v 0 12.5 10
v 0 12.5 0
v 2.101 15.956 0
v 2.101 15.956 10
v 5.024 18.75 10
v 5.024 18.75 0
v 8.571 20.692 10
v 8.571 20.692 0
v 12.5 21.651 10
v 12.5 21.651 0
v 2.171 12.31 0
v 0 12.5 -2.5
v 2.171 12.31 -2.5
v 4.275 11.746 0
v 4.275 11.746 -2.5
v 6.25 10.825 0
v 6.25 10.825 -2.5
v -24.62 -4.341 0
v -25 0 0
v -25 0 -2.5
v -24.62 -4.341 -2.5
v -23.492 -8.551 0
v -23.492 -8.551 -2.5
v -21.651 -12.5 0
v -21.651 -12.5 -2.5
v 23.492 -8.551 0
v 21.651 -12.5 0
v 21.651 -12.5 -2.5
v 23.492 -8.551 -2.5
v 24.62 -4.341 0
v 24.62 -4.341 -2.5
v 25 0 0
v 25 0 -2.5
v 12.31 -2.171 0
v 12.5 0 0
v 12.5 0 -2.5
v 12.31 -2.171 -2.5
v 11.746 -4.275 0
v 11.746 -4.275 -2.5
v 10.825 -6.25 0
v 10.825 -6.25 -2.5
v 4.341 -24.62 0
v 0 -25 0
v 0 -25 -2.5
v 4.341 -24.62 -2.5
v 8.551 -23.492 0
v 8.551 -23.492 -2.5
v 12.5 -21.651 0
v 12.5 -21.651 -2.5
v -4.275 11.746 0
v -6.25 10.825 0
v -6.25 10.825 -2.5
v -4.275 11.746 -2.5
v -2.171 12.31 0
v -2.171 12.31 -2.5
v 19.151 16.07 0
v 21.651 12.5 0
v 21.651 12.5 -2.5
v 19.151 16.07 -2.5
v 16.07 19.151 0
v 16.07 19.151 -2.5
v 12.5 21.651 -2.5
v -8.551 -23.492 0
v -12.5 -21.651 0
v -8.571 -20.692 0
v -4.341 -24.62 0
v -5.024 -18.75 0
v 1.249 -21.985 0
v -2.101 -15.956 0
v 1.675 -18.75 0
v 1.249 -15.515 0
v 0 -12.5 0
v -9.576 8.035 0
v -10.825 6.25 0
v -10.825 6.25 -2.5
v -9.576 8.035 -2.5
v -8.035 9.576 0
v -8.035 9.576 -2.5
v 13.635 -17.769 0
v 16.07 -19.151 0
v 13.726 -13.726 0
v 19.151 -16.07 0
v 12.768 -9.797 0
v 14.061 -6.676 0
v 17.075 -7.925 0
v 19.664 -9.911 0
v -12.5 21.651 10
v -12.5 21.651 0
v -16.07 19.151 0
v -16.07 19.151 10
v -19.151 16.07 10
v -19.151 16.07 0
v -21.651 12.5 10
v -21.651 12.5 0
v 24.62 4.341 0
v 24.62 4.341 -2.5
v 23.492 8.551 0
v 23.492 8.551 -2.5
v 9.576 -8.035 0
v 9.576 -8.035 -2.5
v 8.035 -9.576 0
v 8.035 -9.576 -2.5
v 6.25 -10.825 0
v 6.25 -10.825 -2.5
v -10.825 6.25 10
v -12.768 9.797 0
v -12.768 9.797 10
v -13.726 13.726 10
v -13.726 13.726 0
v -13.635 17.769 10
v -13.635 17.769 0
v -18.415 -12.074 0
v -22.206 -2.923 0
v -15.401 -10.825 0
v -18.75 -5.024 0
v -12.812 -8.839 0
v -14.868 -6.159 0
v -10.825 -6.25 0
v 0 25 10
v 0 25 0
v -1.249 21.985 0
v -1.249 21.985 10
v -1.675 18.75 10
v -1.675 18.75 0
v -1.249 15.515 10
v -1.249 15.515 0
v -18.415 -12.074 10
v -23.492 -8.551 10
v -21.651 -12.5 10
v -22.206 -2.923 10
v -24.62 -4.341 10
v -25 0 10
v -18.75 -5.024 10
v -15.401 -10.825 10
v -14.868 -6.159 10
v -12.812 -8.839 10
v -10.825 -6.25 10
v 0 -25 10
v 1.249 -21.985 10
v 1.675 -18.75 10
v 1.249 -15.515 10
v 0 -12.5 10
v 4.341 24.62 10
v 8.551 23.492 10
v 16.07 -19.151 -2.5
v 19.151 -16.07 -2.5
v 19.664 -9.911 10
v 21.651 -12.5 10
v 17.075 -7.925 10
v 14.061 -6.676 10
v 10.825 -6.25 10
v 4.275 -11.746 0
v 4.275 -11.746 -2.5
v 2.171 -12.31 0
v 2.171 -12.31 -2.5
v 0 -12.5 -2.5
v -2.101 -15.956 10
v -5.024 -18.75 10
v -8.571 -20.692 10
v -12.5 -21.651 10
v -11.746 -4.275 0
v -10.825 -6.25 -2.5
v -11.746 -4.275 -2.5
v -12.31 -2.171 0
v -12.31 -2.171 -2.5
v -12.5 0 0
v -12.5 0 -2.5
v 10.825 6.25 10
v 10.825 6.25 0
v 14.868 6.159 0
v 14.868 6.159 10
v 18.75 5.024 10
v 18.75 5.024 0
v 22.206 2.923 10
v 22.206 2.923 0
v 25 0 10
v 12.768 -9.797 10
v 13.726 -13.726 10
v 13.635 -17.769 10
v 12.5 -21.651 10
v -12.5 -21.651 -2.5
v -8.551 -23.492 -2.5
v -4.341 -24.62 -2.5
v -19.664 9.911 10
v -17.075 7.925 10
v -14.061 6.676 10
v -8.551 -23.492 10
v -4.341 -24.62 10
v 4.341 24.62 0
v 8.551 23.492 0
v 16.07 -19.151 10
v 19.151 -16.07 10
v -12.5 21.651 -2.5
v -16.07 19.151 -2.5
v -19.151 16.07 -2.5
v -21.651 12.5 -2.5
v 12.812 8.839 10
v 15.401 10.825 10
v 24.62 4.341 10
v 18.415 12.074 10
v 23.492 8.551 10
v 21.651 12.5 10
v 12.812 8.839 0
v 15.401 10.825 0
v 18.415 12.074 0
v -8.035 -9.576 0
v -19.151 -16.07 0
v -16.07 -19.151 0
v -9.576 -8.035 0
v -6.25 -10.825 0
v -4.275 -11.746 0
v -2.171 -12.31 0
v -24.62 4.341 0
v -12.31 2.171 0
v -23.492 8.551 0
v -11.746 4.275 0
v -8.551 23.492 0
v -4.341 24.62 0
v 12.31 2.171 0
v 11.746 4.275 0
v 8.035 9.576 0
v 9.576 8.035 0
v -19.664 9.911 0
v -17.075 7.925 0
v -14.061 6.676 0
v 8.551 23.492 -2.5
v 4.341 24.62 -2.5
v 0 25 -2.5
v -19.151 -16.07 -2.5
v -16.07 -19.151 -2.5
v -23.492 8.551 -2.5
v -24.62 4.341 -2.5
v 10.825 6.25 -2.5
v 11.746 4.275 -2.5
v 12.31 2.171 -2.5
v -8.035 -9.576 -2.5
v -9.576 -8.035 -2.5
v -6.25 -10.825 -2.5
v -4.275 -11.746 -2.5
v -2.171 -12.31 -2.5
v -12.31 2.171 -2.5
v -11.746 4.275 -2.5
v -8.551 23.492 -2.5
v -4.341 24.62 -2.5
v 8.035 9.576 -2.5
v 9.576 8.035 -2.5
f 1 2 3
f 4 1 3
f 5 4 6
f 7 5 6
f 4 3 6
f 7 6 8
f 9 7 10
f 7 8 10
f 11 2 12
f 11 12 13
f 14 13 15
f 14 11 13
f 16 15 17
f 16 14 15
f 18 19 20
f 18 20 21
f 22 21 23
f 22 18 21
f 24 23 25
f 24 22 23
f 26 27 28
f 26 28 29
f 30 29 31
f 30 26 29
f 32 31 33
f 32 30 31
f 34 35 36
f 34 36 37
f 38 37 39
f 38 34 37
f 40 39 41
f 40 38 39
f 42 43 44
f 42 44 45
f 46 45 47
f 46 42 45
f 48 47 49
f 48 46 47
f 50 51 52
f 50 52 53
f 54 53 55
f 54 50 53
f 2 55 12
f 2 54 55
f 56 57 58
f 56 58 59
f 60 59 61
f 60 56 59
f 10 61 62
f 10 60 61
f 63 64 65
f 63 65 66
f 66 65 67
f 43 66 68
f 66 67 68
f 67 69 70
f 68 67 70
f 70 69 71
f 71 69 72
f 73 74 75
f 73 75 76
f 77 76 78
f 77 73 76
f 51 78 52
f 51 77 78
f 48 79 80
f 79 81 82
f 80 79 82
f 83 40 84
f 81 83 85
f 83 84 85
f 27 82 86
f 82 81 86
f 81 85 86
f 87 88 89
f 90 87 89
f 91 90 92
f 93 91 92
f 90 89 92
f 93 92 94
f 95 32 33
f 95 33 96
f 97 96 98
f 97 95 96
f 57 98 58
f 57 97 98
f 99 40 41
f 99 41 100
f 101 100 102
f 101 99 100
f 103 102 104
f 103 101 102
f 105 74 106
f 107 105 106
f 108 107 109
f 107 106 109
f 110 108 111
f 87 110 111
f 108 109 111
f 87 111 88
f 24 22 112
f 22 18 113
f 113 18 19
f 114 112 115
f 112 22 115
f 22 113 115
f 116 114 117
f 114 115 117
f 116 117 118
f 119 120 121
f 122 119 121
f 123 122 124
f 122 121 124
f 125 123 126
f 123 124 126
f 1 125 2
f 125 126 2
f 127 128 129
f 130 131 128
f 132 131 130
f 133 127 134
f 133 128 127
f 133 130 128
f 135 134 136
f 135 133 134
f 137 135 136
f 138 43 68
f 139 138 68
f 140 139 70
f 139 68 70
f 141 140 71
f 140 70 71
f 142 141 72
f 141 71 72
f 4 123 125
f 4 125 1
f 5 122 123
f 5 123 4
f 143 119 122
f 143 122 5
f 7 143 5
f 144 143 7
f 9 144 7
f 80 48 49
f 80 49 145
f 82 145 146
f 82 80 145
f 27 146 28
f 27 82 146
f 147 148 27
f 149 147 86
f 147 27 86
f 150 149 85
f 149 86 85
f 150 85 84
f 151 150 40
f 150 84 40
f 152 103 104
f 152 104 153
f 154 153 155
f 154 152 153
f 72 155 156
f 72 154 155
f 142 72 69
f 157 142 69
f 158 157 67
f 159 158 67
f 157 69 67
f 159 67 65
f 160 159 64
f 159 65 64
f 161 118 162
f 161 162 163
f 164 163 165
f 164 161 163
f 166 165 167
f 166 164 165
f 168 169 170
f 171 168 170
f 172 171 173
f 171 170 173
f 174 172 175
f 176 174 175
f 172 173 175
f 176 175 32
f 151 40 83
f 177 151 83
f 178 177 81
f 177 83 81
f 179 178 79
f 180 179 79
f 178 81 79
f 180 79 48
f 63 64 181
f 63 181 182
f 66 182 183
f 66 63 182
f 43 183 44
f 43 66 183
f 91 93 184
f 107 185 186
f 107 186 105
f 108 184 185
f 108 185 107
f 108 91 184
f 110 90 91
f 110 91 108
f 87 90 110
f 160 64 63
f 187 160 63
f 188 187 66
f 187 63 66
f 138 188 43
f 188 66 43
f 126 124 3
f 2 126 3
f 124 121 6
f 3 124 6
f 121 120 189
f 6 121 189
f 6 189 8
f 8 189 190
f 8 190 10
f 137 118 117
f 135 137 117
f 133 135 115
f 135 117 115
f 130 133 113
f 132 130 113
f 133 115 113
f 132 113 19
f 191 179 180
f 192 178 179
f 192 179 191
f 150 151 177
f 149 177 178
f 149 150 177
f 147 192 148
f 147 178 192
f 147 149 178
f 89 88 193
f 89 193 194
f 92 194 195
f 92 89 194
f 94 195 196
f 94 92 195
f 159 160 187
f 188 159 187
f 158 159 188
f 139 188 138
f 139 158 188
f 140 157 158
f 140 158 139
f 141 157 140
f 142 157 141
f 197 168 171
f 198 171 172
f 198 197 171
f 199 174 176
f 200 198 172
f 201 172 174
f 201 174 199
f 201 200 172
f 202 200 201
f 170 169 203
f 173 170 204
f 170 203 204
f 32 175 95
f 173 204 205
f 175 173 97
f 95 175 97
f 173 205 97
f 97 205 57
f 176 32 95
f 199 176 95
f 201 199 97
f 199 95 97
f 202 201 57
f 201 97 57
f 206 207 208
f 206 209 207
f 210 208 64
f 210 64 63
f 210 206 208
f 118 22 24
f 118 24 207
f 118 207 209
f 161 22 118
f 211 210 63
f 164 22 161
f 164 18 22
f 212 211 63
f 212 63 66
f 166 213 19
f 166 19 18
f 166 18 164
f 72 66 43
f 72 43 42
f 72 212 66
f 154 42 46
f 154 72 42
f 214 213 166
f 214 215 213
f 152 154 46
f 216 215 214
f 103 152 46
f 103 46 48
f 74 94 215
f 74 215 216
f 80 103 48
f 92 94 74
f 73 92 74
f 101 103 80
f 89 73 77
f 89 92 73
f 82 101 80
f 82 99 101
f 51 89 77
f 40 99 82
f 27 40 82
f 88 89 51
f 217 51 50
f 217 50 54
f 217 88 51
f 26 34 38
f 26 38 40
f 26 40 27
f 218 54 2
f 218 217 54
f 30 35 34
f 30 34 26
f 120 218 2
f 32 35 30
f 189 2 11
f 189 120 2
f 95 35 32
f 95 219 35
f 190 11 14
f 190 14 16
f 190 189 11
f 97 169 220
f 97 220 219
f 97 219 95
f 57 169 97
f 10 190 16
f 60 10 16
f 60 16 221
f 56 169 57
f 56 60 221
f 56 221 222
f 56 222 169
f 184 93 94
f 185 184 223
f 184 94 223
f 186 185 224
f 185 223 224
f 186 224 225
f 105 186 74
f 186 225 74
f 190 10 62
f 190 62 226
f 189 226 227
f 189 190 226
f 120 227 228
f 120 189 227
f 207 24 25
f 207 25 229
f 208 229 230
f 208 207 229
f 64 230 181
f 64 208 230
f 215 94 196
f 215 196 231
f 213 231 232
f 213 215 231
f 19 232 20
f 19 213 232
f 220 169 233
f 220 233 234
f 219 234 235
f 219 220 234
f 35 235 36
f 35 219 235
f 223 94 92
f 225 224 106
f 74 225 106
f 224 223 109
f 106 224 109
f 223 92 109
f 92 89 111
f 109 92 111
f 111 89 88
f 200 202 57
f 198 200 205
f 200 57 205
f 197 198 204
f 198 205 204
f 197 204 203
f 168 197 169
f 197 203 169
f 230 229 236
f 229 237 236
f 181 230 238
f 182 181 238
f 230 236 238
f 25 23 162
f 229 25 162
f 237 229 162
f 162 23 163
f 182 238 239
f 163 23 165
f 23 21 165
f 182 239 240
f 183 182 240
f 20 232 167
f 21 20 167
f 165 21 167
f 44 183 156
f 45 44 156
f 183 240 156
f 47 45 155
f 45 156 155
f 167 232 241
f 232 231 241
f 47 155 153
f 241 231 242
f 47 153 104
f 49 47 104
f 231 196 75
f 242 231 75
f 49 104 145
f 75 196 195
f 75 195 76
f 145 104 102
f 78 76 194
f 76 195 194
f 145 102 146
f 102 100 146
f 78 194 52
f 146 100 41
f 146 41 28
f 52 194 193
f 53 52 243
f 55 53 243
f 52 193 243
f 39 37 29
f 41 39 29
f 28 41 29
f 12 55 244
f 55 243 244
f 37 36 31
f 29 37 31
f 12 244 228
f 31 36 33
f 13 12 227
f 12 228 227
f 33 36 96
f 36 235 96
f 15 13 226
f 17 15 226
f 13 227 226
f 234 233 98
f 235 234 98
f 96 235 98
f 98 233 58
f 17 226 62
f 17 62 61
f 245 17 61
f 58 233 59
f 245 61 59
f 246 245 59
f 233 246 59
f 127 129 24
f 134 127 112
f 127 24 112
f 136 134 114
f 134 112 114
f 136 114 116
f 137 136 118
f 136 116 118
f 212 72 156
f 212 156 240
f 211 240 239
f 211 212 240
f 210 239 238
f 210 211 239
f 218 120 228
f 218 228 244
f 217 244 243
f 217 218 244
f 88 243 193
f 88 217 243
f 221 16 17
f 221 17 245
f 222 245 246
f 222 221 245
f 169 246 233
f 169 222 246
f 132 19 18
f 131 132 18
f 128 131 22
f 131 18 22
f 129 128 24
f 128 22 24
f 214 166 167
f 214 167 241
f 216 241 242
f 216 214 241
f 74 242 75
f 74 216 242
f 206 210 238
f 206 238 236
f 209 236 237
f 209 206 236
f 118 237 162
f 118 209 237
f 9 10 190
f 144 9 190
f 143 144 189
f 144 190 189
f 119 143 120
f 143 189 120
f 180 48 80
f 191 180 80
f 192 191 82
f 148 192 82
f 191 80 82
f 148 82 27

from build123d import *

# Parameters (mm, degrees)
F1_DEPTH = 10
F2_DEPTH = 2.5


with BuildPart() as f1:
    # F0 (on Top) → F1 (new body)
    with BuildSketch(Plane.XY):
        with BuildLine():
            ThreePointArc((10.8253175473, 6.25), (18.75, 5.0240473581), (25, 0))
            ThreePointArc((25, 0), (24.1481456572, 6.4704761276), (21.6506350946, 12.5))
            ThreePointArc((21.6506350946, 12.5), (15.4006350946, 10.8253175473), (10.8253175473, 6.25))
        make_face()
    extrude(amount=F1_DEPTH)


with BuildPart() as f1b:
    # F0 (on Top) → F1, piece 2 (new body)
    with BuildSketch(Plane.XY):
        with BuildLine():
            ThreePointArc((12.5, -21.6506350946), (17.6776695297, -17.6776695297), (21.6506350946, -12.5))
            ThreePointArc((21.6506350946, -12.5), (17.0753175473, -7.9246824527), (10.8253175473, -6.25))
            ThreePointArc((10.8253175473, -6.25), (13.7259526419, -13.7259526419), (12.5, -21.6506350946))
        make_face()
    extrude(amount=F1_DEPTH)


with BuildPart() as f1c:
    # F0 (on Top) → F1, piece 3 (new body)
    with BuildSketch(Plane.XY):
        with BuildLine():
            ThreePointArc((0, 12.5), (5.0240473581, 18.75), (12.5, 21.6506350946))
            ThreePointArc((12.5, 21.6506350946), (6.4704761276, 24.1481456572), (0, 25))
            ThreePointArc((0, 25), (-1.6746824527, 18.75), (0, 12.5))
        make_face()
    extrude(amount=F1_DEPTH)


with BuildPart() as f1d:
    # F0 (on Top) → F1, piece 4 (new body)
    with BuildSketch(Plane.XY):
        with BuildLine():
            ThreePointArc((-12.5, -21.6506350946), (-6.4704761276, -24.1481456572), (0, -25))
            ThreePointArc((0, -25), (1.6746824527, -18.75), (0, -12.5))
            ThreePointArc((0, -12.5), (-5.0240473581, -18.75), (-12.5, -21.6506350946))
        make_face()
    extrude(amount=F1_DEPTH)


with BuildPart() as f1e:
    # F0 (on Top) → F1, piece 5 (new body)
    with BuildSketch(Plane.XY):
        with BuildLine():
            ThreePointArc((-21.6506350946, 12.5), (-17.0753175473, 7.9246824527), (-10.8253175473, 6.25))
            ThreePointArc((-10.8253175473, 6.25), (-13.7259526419, 13.7259526419), (-12.5, 21.6506350946))
            ThreePointArc((-12.5, 21.6506350946), (-17.6776695297, 17.6776695297), (-21.6506350946, 12.5))
        make_face()
    extrude(amount=F1_DEPTH)


with BuildPart() as f1f:
    # F0 (on Top) → F1, piece 6 (new body)
    with BuildSketch(Plane.XY):
        with BuildLine():
            ThreePointArc((-21.6506350946, -12.5), (-15.4006350946, -10.8253175473), (-10.8253175473, -6.25))
            ThreePointArc((-10.8253175473, -6.25), (-18.75, -5.0240473581), (-25, 0))
            ThreePointArc((-25, 0), (-24.1481456572, -6.4704761276), (-21.6506350946, -12.5))
        make_face()
    extrude(amount=F1_DEPTH)


with BuildPart() as f2:
    # F0 (on Top) → F2 (new body)
    with BuildSketch(Plane.XY):
        with BuildLine():
            ThreePointArc((10.8253175473, 6.25), (18.75, 5.0240473581), (25, 0))
            ThreePointArc((25, 0), (24.1481456572, 6.4704761276), (21.6506350946, 12.5))
            ThreePointArc((21.6506350946, 12.5), (15.4006350946, 10.8253175473), (10.8253175473, 6.25))
        make_face()
        with BuildLine():
            ThreePointArc((21.6506350946, -12.5), (24.1481456572, -6.4704761276), (25, 0))
            Line((25, 0), (12.5, 0))
            ThreePointArc((12.5, 0), (18.75, -5.0240473581), (21.6506350946, -12.5))
        make_face()
        with BuildLine():
            Line((12.5, 0), (25, 0))
            ThreePointArc((25, 0), (18.75, 5.0240473581), (10.8253175473, 6.25))
            ThreePointArc((10.8253175473, 6.25), (12.0740728286, 3.2352380638), (12.5, 0))
        make_face()
        with BuildLine():
            ThreePointArc((6.25, 10.8253175473), (13.7259526419, 13.7259526419), (21.6506350946, 12.5))
            ThreePointArc((21.6506350946, 12.5), (17.6776695297, 17.6776695297), (12.5, 21.6506350946))
            Line((12.5, 21.6506350946), (6.25, 10.8253175473))
        make_face()
        with BuildLine():
            ThreePointArc((10.8253175473, 6.25), (15.4006350946, 10.8253175473), (21.6506350946, 12.5))
            ThreePointArc((21.6506350946, 12.5), (13.7259526419, 13.7259526419), (6.25, 10.8253175473))
            ThreePointArc((6.25, 10.8253175473), (8.8388347648, 8.8388347648), (10.8253175473, 6.25))
        make_face()
        with BuildLine():
            ThreePointArc((10.8253175473, -6.25), (17.0753175473, -7.9246824527), (21.6506350946, -12.5))
            ThreePointArc((21.6506350946, -12.5), (18.75, -5.0240473581), (12.5, 0))
            ThreePointArc((12.5, 0), (12.0740728286, -3.2352380638), (10.8253175473, -6.25))
        make_face()
        with BuildLine():
            ThreePointArc((12.5, -21.6506350946), (17.6776695297, -17.6776695297), (21.6506350946, -12.5))
            ThreePointArc((21.6506350946, -12.5), (17.0753175473, -7.9246824527), (10.8253175473, -6.25))
            ThreePointArc((10.8253175473, -6.25), (13.7259526419, -13.7259526419), (12.5, -21.6506350946))
        make_face()
        with BuildLine():
            ThreePointArc((0, 12.5), (5.0240473581, 18.75), (12.5, 21.6506350946))
            ThreePointArc((12.5, 21.6506350946), (6.4704761276, 24.1481456572), (0, 25))
            ThreePointArc((0, 25), (-1.6746824527, 18.75), (0, 12.5))
        make_face()
        with BuildLine():
            Line((6.25, 10.8253175473), (12.5, 21.6506350946))
            ThreePointArc((12.5, 21.6506350946), (5.0240473581, 18.75), (0, 12.5))
            ThreePointArc((0, 12.5), (3.2352380638, 12.0740728286), (6.25, 10.8253175473))
        make_face()
        with BuildLine():
            ThreePointArc((0, -25), (6.4704761276, -24.1481456572), (12.5, -21.6506350946))
            Line((12.5, -21.6506350946), (6.25, -10.8253175473))
            ThreePointArc((6.25, -10.8253175473), (5.0240473581, -18.75), (0, -25))
        make_face()
        with BuildLine():
            Line((6.25, -10.8253175473), (12.5, -21.6506350946))
            ThreePointArc((12.5, -21.6506350946), (13.7259526419, -13.7259526419), (10.8253175473, -6.25))
            ThreePointArc((10.8253175473, -6.25), (8.8388347648, -8.8388347648), (6.25, -10.8253175473))
        make_face()
        with BuildLine():
            ThreePointArc((-6.25, 10.8253175473), (-5.0240473581, 18.75), (0, 25))
            ThreePointArc((0, 25), (-6.4704761276, 24.1481456572), (-12.5, 21.6506350946))
            Line((-12.5, 21.6506350946), (-6.25, 10.8253175473))
        make_face()
        with BuildLine():
            ThreePointArc((0, 12.5), (-1.6746824527, 18.75), (0, 25))
            ThreePointArc((0, 25), (-5.0240473581, 18.75), (-6.25, 10.8253175473))
            ThreePointArc((-6.25, 10.8253175473), (-3.2352380638, 12.0740728286), (0, 12.5))
        make_face()
        with BuildLine():
            ThreePointArc((0, -12.5), (1.6746824527, -18.75), (0, -25))
            ThreePointArc((0, -25), (5.0240473581, -18.75), (6.25, -10.8253175473))
            ThreePointArc((6.25, -10.8253175473), (3.2352380638, -12.0740728286), (0, -12.5))
        make_face()
        with BuildLine():
            ThreePointArc((-12.5, -21.6506350946), (-6.4704761276, -24.1481456572), (0, -25))
            ThreePointArc((0, -25), (1.6746824527, -18.75), (0, -12.5))
            ThreePointArc((0, -12.5), (-5.0240473581, -18.75), (-12.5, -21.6506350946))
        make_face()
        with BuildLine():
            ThreePointArc((-12.5, 21.6506350946), (-13.7259526419, 13.7259526419), (-10.8253175473, 6.25))
            ThreePointArc((-10.8253175473, 6.25), (-8.8388347648, 8.8388347648), (-6.25, 10.8253175473))
            Line((-6.25, 10.8253175473), (-12.5, 21.6506350946))
        make_face()
        with BuildLine():
            ThreePointArc((-21.6506350946, 12.5), (-17.0753175473, 7.9246824527), (-10.8253175473, 6.25))
            ThreePointArc((-10.8253175473, 6.25), (-13.7259526419, 13.7259526419), (-12.5, 21.6506350946))
            ThreePointArc((-12.5, 21.6506350946), (-17.6776695297, 17.6776695297), (-21.6506350946, 12.5))
        make_face()
        with BuildLine():
            ThreePointArc((-12.5, 0), (-12.0740728286, 3.2352380638), (-10.8253175473, 6.25))
            ThreePointArc((-10.8253175473, 6.25), (-17.0753175473, 7.9246824527), (-21.6506350946, 12.5))
            ThreePointArc((-21.6506350946, 12.5), (-18.75, 5.0240473581), (-12.5, 0))
        make_face()
        with BuildLine():
            ThreePointArc((-25, 0), (-18.75, -5.0240473581), (-10.8253175473, -6.25))
            ThreePointArc((-10.8253175473, -6.25), (-12.0740728286, -3.2352380638), (-12.5, 0))
            Line((-12.5, 0), (-25, 0))
        make_face()
        with BuildLine():
            ThreePointArc((-21.6506350946, -12.5), (-15.4006350946, -10.8253175473), (-10.8253175473, -6.25))
            ThreePointArc((-10.8253175473, -6.25), (-18.75, -5.0240473581), (-25, 0))
            ThreePointArc((-25, 0), (-24.1481456572, -6.4704761276), (-21.6506350946, -12.5))
        make_face()
        with BuildLine():
            ThreePointArc((-6.25, -10.8253175473), (-8.8388347648, -8.8388347648), (-10.8253175473, -6.25))
            ThreePointArc((-10.8253175473, -6.25), (-15.4006350946, -10.8253175473), (-21.6506350946, -12.5))
            ThreePointArc((-21.6506350946, -12.5), (-13.7259526419, -13.7259526419), (-6.25, -10.8253175473))
        make_face()
        with BuildLine():
            ThreePointArc((-12.5, -21.6506350946), (-5.0240473581, -18.75), (0, -12.5))
            ThreePointArc((0, -12.5), (-3.2352380638, -12.0740728286), (-6.25, -10.8253175473))
            Line((-6.25, -10.8253175473), (-12.5, -21.6506350946))
        make_face()
        with BuildLine():
            ThreePointArc((-21.6506350946, -12.5), (-17.6776695297, -17.6776695297), (-12.5, -21.6506350946))
            Line((-12.5, -21.6506350946), (-6.25, -10.8253175473))
            ThreePointArc((-6.25, -10.8253175473), (-13.7259526419, -13.7259526419), (-21.6506350946, -12.5))
        make_face()
        with BuildLine():
            Line((-25, 0), (-12.5, 0))
            ThreePointArc((-12.5, 0), (-18.75, 5.0240473581), (-21.6506350946, 12.5))
            ThreePointArc((-21.6506350946, 12.5), (-24.1481456572, 6.4704761276), (-25, 0))
        make_face()
    extrude(amount=-F2_DEPTH)


solid = Compound([f1.part, f1b.part, f1c.part, f1d.part, f1e.part, f1f.part, f2.part])
